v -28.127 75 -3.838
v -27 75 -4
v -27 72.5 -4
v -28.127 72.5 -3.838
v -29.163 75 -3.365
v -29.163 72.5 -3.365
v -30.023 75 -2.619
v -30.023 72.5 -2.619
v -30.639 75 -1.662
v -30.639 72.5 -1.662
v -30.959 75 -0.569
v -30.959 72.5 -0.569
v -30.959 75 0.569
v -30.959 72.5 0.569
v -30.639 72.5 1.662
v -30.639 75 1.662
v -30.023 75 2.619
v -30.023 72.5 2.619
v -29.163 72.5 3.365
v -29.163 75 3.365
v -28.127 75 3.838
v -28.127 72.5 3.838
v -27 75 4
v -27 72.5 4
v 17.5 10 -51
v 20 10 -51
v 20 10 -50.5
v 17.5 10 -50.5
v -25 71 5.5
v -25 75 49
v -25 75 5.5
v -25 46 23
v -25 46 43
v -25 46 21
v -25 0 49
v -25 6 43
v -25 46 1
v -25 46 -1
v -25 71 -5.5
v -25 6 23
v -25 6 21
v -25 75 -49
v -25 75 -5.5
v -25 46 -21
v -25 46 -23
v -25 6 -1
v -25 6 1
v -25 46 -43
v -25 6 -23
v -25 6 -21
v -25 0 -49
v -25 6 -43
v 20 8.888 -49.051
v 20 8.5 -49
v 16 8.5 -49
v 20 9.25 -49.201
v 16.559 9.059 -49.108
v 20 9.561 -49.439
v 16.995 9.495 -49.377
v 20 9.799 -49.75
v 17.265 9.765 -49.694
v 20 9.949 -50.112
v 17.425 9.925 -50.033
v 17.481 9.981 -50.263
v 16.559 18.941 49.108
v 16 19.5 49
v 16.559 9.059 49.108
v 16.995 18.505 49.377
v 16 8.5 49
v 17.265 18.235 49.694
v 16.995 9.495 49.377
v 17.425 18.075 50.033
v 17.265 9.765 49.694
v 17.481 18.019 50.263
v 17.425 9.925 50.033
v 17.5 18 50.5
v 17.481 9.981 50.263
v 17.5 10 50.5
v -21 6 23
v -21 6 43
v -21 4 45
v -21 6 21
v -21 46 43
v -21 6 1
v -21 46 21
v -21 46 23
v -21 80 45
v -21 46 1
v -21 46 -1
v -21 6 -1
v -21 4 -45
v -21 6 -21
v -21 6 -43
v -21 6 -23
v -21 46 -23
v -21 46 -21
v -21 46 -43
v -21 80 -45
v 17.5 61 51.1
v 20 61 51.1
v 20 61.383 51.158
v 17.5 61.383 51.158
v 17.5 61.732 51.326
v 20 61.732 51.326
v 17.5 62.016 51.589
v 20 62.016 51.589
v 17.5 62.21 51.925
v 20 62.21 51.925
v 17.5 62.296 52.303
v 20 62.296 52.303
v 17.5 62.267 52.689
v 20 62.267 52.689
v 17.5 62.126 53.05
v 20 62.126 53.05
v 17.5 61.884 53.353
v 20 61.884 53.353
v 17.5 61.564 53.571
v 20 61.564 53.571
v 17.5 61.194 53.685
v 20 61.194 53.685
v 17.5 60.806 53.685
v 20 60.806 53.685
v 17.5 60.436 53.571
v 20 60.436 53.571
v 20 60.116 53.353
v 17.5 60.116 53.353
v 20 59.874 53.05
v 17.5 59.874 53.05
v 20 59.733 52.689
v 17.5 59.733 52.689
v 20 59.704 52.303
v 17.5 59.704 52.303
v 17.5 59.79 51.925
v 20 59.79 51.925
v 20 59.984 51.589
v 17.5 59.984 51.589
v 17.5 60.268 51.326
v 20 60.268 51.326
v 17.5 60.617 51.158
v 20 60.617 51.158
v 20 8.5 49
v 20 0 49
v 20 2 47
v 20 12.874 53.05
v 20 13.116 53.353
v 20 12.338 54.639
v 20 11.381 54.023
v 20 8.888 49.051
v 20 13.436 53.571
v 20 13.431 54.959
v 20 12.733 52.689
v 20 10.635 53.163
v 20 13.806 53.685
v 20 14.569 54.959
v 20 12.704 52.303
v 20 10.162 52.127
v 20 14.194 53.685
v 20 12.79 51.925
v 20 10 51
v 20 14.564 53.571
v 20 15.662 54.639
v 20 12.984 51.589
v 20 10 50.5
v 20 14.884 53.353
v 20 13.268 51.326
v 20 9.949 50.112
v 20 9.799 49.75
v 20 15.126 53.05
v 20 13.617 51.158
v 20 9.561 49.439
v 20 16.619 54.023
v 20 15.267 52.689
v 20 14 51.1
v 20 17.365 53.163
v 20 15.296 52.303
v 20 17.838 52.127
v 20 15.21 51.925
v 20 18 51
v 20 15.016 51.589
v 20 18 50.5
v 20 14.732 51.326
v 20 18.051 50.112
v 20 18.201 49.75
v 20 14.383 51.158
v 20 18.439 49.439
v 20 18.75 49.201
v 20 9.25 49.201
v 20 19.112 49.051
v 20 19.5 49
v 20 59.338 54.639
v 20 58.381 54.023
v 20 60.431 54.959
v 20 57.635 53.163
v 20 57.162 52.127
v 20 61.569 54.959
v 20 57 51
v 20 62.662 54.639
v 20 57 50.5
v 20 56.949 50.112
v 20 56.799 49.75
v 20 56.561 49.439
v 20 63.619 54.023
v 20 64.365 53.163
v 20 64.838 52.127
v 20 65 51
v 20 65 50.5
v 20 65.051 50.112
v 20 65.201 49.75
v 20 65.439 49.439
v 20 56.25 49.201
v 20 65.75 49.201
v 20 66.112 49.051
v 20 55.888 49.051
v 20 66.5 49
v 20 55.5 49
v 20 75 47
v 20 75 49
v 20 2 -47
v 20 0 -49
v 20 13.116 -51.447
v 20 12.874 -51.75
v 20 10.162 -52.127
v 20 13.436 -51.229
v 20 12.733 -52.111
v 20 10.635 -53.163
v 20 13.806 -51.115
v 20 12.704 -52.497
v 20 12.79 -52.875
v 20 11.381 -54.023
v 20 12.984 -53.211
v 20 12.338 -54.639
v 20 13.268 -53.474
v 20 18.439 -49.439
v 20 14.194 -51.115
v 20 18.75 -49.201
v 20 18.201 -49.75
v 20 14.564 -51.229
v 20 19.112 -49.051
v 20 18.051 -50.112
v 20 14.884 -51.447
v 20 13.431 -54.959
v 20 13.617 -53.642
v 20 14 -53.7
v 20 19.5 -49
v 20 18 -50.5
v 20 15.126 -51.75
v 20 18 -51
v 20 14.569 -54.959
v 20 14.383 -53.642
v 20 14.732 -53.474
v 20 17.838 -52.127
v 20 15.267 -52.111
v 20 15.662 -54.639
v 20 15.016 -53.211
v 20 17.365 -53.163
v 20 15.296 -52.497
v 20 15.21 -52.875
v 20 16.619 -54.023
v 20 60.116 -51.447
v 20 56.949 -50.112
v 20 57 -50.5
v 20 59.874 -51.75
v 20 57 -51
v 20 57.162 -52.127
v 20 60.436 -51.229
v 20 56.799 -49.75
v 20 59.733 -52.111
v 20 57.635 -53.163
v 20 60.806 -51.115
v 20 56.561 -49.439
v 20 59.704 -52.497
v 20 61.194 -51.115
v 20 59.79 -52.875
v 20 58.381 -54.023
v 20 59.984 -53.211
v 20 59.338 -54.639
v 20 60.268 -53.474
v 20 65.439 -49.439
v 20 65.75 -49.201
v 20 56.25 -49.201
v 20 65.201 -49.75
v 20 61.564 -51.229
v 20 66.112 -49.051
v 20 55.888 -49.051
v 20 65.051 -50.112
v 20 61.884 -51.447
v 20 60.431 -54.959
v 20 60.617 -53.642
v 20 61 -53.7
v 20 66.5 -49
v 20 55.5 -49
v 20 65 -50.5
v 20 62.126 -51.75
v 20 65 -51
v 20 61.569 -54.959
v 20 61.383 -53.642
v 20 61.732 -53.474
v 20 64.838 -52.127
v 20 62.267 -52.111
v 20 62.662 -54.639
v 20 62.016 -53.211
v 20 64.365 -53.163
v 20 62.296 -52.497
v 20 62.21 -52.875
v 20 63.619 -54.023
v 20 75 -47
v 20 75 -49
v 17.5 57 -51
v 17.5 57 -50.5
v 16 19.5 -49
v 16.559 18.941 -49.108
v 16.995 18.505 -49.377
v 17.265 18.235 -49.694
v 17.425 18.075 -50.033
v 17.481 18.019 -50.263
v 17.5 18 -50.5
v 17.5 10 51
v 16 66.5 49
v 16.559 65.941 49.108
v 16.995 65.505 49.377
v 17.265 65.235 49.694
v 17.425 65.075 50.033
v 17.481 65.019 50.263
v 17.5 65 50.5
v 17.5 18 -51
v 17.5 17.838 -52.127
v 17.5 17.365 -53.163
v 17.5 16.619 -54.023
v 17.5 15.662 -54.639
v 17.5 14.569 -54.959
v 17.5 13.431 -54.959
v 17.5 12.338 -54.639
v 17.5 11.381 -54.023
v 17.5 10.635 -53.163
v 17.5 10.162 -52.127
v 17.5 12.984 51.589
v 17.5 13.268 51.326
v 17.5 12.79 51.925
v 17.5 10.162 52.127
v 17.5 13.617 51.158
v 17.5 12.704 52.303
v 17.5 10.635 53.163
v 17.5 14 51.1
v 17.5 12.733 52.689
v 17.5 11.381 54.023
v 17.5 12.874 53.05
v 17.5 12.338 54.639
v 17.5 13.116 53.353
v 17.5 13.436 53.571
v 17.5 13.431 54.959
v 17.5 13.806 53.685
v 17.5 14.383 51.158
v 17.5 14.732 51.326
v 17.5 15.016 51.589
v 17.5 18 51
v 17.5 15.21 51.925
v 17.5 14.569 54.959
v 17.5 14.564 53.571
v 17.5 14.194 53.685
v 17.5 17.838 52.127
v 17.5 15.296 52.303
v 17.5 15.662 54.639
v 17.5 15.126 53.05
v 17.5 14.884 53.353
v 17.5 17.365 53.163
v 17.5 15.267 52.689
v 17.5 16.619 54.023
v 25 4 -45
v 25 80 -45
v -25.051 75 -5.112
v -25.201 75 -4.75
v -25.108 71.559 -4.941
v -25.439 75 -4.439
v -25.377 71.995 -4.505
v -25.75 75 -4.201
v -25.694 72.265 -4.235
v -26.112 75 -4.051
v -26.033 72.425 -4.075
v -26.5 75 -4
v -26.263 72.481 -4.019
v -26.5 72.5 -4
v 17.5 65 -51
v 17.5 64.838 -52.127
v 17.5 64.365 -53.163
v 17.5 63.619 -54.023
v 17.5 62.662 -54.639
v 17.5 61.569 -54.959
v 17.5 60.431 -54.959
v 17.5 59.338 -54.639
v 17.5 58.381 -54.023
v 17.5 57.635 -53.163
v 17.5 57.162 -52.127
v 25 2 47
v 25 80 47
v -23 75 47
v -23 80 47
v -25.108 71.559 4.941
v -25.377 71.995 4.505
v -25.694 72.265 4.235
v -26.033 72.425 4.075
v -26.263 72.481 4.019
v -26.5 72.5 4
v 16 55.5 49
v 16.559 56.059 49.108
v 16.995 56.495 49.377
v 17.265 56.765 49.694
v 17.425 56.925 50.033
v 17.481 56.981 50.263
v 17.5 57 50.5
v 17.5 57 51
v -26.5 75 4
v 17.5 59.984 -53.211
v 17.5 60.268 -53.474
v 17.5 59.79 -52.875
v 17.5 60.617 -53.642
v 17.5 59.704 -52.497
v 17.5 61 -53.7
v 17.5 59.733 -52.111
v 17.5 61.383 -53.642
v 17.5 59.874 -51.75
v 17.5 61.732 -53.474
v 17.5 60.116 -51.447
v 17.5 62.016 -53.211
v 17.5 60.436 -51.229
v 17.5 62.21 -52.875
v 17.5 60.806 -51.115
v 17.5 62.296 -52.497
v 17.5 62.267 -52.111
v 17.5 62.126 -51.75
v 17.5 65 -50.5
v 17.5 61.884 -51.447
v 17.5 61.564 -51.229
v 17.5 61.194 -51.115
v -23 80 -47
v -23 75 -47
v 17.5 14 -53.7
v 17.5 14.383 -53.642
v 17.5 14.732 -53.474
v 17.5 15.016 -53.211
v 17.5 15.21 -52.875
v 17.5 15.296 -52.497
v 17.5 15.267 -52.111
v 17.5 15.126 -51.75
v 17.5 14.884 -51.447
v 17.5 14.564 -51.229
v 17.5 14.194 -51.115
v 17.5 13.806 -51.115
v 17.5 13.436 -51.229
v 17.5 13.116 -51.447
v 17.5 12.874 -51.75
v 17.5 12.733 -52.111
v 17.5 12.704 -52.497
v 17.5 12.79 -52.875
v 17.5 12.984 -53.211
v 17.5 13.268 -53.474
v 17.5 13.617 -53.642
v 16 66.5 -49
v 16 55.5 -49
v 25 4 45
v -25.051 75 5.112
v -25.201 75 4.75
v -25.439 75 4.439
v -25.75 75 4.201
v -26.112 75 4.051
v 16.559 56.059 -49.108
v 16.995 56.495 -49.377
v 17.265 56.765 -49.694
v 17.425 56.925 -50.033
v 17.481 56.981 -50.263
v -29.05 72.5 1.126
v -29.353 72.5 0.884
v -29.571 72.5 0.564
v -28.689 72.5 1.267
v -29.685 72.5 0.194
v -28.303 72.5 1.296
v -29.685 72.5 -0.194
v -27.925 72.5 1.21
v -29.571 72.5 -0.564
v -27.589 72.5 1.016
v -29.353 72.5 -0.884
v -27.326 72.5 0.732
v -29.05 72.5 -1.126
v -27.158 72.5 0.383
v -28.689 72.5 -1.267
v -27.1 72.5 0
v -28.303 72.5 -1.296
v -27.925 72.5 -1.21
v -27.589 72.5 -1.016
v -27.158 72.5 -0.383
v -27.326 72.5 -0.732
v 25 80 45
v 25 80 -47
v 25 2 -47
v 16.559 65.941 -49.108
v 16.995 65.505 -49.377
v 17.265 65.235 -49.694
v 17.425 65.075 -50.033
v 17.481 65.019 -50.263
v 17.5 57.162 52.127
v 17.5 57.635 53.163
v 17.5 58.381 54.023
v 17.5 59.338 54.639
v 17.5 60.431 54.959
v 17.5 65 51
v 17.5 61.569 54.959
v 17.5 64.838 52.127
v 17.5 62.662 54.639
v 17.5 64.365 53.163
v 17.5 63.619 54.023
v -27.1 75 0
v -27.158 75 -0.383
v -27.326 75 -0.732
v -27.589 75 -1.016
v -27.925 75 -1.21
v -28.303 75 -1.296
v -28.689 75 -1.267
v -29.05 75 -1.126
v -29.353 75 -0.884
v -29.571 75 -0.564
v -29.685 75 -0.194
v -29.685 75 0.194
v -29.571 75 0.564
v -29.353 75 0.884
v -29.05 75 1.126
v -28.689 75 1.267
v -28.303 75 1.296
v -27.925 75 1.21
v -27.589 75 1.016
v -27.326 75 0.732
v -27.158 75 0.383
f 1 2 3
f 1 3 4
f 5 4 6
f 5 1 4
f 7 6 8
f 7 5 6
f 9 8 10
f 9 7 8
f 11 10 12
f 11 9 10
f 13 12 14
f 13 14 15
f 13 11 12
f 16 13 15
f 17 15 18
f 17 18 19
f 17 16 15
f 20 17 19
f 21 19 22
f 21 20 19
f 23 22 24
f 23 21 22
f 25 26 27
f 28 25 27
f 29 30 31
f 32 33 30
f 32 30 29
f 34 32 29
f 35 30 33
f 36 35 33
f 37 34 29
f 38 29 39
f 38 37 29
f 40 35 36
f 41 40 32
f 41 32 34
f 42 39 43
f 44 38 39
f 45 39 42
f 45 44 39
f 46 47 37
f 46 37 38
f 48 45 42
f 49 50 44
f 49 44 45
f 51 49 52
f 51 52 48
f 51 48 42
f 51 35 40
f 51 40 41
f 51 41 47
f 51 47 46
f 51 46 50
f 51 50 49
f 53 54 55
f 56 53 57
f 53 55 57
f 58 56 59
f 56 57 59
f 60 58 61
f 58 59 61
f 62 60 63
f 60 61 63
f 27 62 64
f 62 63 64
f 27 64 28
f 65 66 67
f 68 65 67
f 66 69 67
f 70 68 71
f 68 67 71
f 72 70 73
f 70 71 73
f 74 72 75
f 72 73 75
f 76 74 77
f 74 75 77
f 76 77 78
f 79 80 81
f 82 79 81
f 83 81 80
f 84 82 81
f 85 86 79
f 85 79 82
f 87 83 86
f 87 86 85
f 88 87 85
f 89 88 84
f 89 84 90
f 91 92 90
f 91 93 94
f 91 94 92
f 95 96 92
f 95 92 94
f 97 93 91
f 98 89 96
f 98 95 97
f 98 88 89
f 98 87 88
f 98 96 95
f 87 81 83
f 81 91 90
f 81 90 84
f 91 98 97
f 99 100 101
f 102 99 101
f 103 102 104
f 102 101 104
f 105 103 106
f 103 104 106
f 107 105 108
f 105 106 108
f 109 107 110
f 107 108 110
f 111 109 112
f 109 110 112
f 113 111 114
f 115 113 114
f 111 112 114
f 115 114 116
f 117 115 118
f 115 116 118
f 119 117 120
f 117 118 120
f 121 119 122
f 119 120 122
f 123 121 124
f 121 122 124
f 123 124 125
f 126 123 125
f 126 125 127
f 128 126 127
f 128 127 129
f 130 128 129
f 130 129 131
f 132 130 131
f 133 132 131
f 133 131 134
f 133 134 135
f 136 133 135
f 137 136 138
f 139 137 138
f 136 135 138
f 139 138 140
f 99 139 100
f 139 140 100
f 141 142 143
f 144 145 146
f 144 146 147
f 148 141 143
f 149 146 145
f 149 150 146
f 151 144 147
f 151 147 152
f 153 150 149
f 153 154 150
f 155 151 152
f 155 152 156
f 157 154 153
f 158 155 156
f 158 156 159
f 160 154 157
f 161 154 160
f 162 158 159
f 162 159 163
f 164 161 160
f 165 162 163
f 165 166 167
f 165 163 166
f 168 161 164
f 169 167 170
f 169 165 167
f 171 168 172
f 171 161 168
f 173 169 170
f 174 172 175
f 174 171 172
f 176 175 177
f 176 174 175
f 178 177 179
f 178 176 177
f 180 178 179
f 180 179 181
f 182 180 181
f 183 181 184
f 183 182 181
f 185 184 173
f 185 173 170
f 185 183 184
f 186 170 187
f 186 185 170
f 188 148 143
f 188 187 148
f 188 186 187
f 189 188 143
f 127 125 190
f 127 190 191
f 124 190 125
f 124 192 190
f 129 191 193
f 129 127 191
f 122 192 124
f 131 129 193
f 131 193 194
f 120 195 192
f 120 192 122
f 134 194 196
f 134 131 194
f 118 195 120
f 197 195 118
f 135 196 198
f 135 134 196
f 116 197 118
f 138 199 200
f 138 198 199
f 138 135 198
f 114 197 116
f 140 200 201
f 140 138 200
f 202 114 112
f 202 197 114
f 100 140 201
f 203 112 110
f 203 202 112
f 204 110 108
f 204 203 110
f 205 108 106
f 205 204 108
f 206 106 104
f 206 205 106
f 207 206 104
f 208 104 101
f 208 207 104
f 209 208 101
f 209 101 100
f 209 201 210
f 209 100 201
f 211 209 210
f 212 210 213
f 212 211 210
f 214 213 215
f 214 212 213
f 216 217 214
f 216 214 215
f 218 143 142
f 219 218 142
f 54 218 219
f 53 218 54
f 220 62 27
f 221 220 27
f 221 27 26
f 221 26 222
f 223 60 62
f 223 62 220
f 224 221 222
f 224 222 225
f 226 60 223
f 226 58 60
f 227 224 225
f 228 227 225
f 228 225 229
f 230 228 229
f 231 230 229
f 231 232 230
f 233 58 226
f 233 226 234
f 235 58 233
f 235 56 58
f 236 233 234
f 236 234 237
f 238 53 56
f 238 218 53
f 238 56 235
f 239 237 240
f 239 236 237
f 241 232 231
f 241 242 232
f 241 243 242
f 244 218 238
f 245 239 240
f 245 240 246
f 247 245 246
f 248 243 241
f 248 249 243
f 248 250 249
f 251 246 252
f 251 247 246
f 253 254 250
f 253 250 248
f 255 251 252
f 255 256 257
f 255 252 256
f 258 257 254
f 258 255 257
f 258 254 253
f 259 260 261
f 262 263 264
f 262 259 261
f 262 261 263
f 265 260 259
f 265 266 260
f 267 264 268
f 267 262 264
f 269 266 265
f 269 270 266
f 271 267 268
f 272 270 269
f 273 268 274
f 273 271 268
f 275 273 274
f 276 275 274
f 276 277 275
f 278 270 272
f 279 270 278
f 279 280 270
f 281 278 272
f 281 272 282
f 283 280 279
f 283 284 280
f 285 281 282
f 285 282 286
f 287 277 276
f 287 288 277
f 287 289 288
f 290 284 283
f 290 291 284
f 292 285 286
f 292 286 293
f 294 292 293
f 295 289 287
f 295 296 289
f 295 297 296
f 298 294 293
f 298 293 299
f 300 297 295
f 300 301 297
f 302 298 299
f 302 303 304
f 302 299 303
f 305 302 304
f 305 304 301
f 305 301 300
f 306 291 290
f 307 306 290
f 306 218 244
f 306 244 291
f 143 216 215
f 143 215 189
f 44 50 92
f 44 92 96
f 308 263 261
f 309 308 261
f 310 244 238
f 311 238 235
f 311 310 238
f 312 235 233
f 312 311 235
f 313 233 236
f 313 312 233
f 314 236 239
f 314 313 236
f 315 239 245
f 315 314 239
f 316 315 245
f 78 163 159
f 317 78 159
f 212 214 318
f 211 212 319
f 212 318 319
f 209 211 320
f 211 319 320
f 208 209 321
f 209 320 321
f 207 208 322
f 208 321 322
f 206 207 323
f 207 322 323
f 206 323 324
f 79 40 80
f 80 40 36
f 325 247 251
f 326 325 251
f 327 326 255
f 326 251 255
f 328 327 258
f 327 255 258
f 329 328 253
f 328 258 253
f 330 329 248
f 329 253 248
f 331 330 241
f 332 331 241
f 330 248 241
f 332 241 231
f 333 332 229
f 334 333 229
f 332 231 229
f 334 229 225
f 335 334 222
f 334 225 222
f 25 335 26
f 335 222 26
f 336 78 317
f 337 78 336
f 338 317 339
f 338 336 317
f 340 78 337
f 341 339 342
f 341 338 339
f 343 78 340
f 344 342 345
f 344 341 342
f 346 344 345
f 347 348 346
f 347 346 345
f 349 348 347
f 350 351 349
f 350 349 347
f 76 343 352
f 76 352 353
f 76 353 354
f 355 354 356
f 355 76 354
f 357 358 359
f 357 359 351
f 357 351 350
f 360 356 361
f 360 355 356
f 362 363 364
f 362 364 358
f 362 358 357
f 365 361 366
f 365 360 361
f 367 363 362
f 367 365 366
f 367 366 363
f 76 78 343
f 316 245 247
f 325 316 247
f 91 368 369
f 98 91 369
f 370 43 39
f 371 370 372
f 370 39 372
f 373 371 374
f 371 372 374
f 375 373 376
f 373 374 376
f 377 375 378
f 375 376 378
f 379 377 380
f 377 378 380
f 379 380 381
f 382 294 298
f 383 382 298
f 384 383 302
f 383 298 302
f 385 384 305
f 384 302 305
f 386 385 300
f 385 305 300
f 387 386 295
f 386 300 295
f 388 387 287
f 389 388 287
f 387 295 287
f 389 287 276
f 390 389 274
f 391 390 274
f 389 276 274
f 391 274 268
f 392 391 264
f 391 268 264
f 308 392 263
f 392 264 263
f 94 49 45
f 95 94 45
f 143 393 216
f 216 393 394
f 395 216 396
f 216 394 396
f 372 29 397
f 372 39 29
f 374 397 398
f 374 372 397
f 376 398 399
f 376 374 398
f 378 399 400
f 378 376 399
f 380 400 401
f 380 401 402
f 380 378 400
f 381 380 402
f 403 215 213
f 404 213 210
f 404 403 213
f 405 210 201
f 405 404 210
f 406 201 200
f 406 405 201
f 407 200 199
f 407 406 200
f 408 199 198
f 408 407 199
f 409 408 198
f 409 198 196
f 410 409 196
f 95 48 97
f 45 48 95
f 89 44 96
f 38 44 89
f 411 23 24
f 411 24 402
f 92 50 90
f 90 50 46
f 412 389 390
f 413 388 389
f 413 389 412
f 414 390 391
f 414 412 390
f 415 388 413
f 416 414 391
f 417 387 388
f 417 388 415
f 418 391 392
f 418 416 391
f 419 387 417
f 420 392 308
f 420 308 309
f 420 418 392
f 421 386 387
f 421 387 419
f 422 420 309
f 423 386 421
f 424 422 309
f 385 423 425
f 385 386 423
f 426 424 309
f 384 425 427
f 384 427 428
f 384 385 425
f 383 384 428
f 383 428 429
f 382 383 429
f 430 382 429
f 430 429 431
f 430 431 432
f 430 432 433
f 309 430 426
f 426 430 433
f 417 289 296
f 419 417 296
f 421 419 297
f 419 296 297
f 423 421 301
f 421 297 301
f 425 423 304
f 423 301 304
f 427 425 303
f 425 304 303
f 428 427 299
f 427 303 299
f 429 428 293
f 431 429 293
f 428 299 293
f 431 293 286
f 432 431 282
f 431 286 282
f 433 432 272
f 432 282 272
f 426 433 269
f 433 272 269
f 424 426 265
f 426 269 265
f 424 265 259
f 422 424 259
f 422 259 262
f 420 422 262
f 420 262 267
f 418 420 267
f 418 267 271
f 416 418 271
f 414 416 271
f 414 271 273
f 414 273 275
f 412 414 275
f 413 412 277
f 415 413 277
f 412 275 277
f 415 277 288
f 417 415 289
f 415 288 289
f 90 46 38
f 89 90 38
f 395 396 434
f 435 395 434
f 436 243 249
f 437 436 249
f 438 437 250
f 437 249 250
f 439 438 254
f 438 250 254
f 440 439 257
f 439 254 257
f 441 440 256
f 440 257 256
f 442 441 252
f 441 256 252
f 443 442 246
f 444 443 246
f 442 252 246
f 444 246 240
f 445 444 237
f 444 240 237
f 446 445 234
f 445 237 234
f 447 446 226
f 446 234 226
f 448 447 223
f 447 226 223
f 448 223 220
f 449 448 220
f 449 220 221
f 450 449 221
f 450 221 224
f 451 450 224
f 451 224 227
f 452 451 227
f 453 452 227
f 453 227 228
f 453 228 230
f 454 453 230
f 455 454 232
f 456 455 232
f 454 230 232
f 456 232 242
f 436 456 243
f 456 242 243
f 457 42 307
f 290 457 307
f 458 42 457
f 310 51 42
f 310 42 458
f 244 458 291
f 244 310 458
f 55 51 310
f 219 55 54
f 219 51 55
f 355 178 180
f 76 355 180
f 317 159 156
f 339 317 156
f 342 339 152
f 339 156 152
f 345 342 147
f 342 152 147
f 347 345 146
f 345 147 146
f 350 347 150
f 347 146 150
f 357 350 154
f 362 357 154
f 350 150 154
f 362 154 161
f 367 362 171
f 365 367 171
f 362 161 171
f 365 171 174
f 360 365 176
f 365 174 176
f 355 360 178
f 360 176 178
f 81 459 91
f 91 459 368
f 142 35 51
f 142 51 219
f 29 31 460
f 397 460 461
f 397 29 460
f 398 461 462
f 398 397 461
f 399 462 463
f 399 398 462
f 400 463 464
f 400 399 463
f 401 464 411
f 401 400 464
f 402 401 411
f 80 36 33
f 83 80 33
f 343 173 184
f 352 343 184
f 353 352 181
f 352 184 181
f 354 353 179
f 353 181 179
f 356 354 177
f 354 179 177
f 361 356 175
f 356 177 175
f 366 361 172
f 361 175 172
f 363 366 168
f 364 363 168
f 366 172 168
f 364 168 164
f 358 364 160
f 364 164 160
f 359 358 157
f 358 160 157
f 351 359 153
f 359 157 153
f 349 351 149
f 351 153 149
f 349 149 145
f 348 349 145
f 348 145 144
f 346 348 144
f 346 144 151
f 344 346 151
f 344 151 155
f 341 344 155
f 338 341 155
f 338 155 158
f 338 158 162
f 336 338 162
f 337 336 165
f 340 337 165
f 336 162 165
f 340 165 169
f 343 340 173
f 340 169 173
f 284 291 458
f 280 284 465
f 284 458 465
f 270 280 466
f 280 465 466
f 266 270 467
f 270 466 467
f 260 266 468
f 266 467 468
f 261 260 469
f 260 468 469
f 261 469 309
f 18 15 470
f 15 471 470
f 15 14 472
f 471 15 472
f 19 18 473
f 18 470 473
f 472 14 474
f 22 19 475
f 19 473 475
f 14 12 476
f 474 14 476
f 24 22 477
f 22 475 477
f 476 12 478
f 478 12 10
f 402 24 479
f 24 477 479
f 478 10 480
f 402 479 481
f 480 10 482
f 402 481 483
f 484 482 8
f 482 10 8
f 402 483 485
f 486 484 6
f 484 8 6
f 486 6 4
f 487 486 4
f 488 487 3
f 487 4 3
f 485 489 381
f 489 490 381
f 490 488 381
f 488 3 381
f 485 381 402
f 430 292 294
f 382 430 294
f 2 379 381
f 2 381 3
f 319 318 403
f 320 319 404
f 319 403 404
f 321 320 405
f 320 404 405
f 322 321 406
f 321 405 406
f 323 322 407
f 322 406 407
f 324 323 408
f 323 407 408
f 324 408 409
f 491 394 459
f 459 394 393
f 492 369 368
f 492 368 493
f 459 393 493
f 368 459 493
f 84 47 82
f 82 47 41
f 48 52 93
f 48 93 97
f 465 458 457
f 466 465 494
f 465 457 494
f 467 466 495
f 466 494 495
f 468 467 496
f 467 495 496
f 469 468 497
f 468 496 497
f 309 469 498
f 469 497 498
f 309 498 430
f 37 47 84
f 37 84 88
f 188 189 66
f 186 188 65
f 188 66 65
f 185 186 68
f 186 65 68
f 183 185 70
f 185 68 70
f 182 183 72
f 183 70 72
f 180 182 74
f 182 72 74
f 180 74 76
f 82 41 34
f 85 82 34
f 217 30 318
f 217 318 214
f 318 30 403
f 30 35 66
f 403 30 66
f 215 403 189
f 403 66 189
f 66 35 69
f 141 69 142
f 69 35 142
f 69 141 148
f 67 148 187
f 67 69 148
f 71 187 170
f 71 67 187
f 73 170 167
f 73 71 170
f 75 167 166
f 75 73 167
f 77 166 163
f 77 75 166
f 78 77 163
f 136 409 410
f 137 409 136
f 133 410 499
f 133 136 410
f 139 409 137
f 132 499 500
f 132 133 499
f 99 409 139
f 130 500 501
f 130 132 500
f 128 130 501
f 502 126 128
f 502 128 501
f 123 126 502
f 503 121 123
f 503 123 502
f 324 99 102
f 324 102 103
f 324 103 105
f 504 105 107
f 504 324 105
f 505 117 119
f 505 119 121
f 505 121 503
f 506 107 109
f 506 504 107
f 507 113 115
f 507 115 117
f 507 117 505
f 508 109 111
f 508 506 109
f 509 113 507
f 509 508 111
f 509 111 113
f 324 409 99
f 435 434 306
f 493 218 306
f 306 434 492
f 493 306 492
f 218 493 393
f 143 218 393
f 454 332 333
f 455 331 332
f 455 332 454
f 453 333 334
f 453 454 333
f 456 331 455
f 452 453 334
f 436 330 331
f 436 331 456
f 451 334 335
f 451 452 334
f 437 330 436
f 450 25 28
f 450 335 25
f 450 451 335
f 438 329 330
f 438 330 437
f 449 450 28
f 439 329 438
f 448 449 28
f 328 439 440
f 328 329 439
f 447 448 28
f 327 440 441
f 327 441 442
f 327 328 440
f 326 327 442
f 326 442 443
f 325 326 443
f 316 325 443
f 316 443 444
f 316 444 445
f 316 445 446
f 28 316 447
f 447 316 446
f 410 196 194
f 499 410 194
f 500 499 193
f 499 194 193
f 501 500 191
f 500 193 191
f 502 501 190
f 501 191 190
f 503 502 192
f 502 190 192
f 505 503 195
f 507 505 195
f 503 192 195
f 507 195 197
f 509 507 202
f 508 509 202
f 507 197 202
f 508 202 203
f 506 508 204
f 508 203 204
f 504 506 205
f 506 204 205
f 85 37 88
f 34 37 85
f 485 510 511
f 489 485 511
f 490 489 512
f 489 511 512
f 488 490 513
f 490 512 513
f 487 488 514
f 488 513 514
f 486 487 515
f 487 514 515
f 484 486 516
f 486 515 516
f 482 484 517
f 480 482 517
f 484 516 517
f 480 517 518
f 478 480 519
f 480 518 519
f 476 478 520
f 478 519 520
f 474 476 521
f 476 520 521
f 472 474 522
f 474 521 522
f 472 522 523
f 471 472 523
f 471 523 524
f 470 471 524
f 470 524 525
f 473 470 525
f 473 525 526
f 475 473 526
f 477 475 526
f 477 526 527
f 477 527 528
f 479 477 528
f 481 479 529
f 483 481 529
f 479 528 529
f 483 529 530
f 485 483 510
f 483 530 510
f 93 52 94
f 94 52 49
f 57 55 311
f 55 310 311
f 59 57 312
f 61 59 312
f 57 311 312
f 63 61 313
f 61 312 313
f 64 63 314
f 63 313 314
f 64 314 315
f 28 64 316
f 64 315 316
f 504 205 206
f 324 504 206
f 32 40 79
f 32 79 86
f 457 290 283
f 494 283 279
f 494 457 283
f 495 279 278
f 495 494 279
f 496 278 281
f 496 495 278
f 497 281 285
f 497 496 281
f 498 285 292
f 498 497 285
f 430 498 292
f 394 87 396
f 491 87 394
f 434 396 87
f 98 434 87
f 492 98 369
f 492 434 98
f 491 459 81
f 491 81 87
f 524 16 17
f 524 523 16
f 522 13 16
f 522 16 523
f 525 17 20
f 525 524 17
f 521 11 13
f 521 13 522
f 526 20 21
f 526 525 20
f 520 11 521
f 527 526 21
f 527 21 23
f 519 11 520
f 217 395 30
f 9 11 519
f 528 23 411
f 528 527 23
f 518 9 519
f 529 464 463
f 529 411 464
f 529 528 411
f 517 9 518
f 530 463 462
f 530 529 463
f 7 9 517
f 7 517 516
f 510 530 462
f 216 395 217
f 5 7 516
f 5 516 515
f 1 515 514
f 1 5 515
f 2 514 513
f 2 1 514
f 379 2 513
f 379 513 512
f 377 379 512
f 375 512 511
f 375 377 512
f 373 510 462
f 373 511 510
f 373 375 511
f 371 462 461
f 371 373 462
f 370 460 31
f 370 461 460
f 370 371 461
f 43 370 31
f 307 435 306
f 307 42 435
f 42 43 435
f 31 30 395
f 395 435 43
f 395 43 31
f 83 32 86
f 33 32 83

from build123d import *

# Parameters (mm, degrees)
SKETCH1_W           = 50
SKETCH1_H           = 98
BOSS_EXTRUDE3_DEPTH = 80
SKETCH4_W           = 90
SKETCH4_H           = 76
CUT_EXTRUDE2_DEPTH  = 46
SKETCH6_W           = 48
SKETCH6_H           = 2
CUT_EXTRUDE3_DEPTH  = 5
SKETCH7_W           = 2
SKETCH7_H           = 73
CUT_EXTRUDE4_DEPTH  = 5
SKETCH10_R          = 1.3
BOSS_EXTRUDE6_DEPTH = 2.5
FILLET2_R           = 1.5
FILLET3_R           = 1.5
SKETCH12_R          = 1.3
BOSS_EXTRUDE7_DEPTH = 2.5
FILLET4_R           = 1.5
CUT_EXTRUDE5_REACH  = 52
SKETCH14_W          = 20
SKETCH14_H          = 40


with BuildPart() as part:
    # Sketch1 → Boss-Extrude3 (new body)
    with BuildSketch(Plane(origin=(0, 0, 0), x_dir=(1, 0, 0), z_dir=(0, 1, 0))):
        Rectangle(SKETCH1_W, SKETCH1_H)
    extrude(amount=BOSS_EXTRUDE3_DEPTH)

    # Sketch4 → Cut-Extrude2 (cut)
    with BuildSketch(Plane(origin=(25, 0, 0), x_dir=(0, 0, -1), z_dir=(1, 0, 0))):
        with Locations((0, 42)):
            Rectangle(SKETCH4_W, SKETCH4_H)
    extrude(amount=-CUT_EXTRUDE2_DEPTH, mode=Mode.SUBTRACT)

    # Sketch6 → Cut-Extrude3 (cut)
    with BuildSketch(Plane(origin=(0, 80, 0), x_dir=(1, 0, 0), z_dir=(0, 1, 0))):
        with Locations((1, 48)):
            Rectangle(SKETCH6_W, SKETCH6_H)
        Polygon((-25, 49), (-25, -47), (-23, -47), (-23, 47), (-23, 49), align=None)
        Polygon((-25, -49), (25, -49), (25, -47), (-23, -47), (-25, -47), align=None)
    extrude(amount=-CUT_EXTRUDE3_DEPTH, mode=Mode.SUBTRACT)

    # Sketch7 → Cut-Extrude4 (cut)
    with BuildSketch(Plane(origin=(25, 0, 0), x_dir=(0, 0, -1), z_dir=(1, 0, 0))):
        Polygon((-47, 75), (-49, 75), (-49, 0), (-47, 0), (-47, 2), align=None)
        Polygon((47, 2), (-47, 2), (-47, 0), (49, 0), (49, 2), align=None)
        with Locations((48, 38.5)):
            Rectangle(SKETCH7_W, SKETCH7_H)
    extrude(amount=-CUT_EXTRUDE4_DEPTH, mode=Mode.SUBTRACT)

    # Sketch10 → Boss-Extrude6 (add)
    with BuildSketch(Plane(origin=(20, 0, 0), x_dir=(0, 0, -1), z_dir=(1, 0, 0))):
        with BuildLine():
            Line((-49, 10), (-51, 10))
            ThreePointArc((-51, 10), (-55, 14), (-51, 18))
            Line((-51, 18), (-49, 18))
            Line((-49, 18), (-49, 10))
        make_face()
        with Locations((-52.4, 14)):
            Circle(SKETCH10_R, mode=Mode.SUBTRACT)
        with BuildLine():
            Line((-49, 65), (-49, 57))
            Line((-49, 57), (-51, 57))
            ThreePointArc((-51, 57), (-55, 61), (-51, 65))
            Line((-51, 65), (-49, 65))
        make_face()
        with Locations((-52.4, 61)):
            Circle(SKETCH10_R, mode=Mode.SUBTRACT)
        with BuildLine():
            Line((49, 10), (49, 18))
            Line((49, 18), (51, 18))
            ThreePointArc((51, 18), (55, 14), (51, 10))
            Line((51, 10), (49, 10))
        make_face()
        with Locations((52.4, 14)):
            Circle(SKETCH10_R, mode=Mode.SUBTRACT)
        with BuildLine():
            Line((49, 65), (51, 65))
            ThreePointArc((51, 65), (55, 61), (51, 57))
            Line((51, 57), (49, 57))
            Line((49, 57), (49, 65))
        make_face()
        with Locations((52.4, 61)):
            Circle(SKETCH10_R, mode=Mode.SUBTRACT)
    extrude(amount=-BOSS_EXTRUDE6_DEPTH)

    # Fillet2
    fillet2_edges = [part.edges().sort_by_distance(p)[0] for p in [
        (17.5, 61, 49),
        (18.75, 65, 49),
        (18.75, 57, 49),
        (17.5, 14, 49),
        (18.75, 18, 49),
        (18.75, 10, 49),
    ]]
    fillet(fillet2_edges, radius=FILLET2_R)

    # Fillet3
    fillet3_edges = [part.edges().sort_by_distance(p)[0] for p in [
        (17.5, 14, -49),
        (18.75, 10, -49),
        (18.75, 18, -49),
        (17.5, 61, -49),
        (18.75, 57, -49),
        (18.75, 65, -49),
    ]]
    fillet(fillet3_edges, radius=FILLET3_R)

    # Sketch12 → Boss-Extrude7 (add)
    with BuildSketch(Plane(origin=(0, 75, 0), x_dir=(1, 0, 0), z_dir=(0, 1, 0))):
        with BuildLine():
            Line((-25, 4), (-27, 4))
            ThreePointArc((-27, 4), (-31, 0), (-27, -4))
            Line((-27, -4), (-25, -4))
            Line((-25, -4), (-25, 4))
        make_face()
        with Locations((-28.4, 0)):
            Circle(SKETCH12_R, mode=Mode.SUBTRACT)
    extrude(amount=-BOSS_EXTRUDE7_DEPTH)

    # Fillet4
    fillet4_edges = [part.edges().sort_by_distance(p)[0] for p in [
        (-25, 72.5, 0),
        (-25, 73.75, -4),
        (-25, 73.75, 4),
    ]]
    fillet(fillet4_edges, radius=FILLET4_R)

    # Sketch14 → Cut-Extrude5 (cut, up to next)
    with BuildSketch(Plane.ZY.offset(25), mode=Mode.PRIVATE) as cut_extrude5_sk1:
        with Locations((33, 26)):
            Rectangle(SKETCH14_W, SKETCH14_H)
    cut_extrude5_tool1 = extrude(cut_extrude5_sk1.sketch, amount=-CUT_EXTRUDE5_REACH, mode=Mode.PRIVATE) & part.part
    add(cut_extrude5_tool1.solids().sort_by_distance((-25, 26, 33))[0], mode=Mode.SUBTRACT)
    # Sketch14 → Cut-Extrude5 (cut, up to next)
    with BuildSketch(Plane.ZY.offset(25), mode=Mode.PRIVATE) as cut_extrude5_sk2:
        with Locations((11, 26)):
            Rectangle(SKETCH14_W, SKETCH14_H)
    cut_extrude5_tool2 = extrude(cut_extrude5_sk2.sketch, amount=-CUT_EXTRUDE5_REACH, mode=Mode.PRIVATE) & part.part
    add(cut_extrude5_tool2.solids().sort_by_distance((-25, 26, 11))[0], mode=Mode.SUBTRACT)
    # Sketch14 → Cut-Extrude5 (cut, up to next)
    with BuildSketch(Plane.ZY.offset(25), mode=Mode.PRIVATE) as cut_extrude5_sk3:
        with Locations((-11, 26)):
            Rectangle(SKETCH14_W, SKETCH14_H)
    cut_extrude5_tool3 = extrude(cut_extrude5_sk3.sketch, amount=-CUT_EXTRUDE5_REACH, mode=Mode.PRIVATE) & part.part
    add(cut_extrude5_tool3.solids().sort_by_distance((-25, 26, -11))[0], mode=Mode.SUBTRACT)
    # Sketch14 → Cut-Extrude5 (cut, up to next)
    with BuildSketch(Plane.ZY.offset(25), mode=Mode.PRIVATE) as cut_extrude5_sk4:
        with Locations((-33, 26)):
            Rectangle(SKETCH14_W, SKETCH14_H)
    cut_extrude5_tool4 = extrude(cut_extrude5_sk4.sketch, amount=-CUT_EXTRUDE5_REACH, mode=Mode.PRIVATE) & part.part
    add(cut_extrude5_tool4.solids().sort_by_distance((-25, 26, -33))[0], mode=Mode.SUBTRACT)


solid = part.part
